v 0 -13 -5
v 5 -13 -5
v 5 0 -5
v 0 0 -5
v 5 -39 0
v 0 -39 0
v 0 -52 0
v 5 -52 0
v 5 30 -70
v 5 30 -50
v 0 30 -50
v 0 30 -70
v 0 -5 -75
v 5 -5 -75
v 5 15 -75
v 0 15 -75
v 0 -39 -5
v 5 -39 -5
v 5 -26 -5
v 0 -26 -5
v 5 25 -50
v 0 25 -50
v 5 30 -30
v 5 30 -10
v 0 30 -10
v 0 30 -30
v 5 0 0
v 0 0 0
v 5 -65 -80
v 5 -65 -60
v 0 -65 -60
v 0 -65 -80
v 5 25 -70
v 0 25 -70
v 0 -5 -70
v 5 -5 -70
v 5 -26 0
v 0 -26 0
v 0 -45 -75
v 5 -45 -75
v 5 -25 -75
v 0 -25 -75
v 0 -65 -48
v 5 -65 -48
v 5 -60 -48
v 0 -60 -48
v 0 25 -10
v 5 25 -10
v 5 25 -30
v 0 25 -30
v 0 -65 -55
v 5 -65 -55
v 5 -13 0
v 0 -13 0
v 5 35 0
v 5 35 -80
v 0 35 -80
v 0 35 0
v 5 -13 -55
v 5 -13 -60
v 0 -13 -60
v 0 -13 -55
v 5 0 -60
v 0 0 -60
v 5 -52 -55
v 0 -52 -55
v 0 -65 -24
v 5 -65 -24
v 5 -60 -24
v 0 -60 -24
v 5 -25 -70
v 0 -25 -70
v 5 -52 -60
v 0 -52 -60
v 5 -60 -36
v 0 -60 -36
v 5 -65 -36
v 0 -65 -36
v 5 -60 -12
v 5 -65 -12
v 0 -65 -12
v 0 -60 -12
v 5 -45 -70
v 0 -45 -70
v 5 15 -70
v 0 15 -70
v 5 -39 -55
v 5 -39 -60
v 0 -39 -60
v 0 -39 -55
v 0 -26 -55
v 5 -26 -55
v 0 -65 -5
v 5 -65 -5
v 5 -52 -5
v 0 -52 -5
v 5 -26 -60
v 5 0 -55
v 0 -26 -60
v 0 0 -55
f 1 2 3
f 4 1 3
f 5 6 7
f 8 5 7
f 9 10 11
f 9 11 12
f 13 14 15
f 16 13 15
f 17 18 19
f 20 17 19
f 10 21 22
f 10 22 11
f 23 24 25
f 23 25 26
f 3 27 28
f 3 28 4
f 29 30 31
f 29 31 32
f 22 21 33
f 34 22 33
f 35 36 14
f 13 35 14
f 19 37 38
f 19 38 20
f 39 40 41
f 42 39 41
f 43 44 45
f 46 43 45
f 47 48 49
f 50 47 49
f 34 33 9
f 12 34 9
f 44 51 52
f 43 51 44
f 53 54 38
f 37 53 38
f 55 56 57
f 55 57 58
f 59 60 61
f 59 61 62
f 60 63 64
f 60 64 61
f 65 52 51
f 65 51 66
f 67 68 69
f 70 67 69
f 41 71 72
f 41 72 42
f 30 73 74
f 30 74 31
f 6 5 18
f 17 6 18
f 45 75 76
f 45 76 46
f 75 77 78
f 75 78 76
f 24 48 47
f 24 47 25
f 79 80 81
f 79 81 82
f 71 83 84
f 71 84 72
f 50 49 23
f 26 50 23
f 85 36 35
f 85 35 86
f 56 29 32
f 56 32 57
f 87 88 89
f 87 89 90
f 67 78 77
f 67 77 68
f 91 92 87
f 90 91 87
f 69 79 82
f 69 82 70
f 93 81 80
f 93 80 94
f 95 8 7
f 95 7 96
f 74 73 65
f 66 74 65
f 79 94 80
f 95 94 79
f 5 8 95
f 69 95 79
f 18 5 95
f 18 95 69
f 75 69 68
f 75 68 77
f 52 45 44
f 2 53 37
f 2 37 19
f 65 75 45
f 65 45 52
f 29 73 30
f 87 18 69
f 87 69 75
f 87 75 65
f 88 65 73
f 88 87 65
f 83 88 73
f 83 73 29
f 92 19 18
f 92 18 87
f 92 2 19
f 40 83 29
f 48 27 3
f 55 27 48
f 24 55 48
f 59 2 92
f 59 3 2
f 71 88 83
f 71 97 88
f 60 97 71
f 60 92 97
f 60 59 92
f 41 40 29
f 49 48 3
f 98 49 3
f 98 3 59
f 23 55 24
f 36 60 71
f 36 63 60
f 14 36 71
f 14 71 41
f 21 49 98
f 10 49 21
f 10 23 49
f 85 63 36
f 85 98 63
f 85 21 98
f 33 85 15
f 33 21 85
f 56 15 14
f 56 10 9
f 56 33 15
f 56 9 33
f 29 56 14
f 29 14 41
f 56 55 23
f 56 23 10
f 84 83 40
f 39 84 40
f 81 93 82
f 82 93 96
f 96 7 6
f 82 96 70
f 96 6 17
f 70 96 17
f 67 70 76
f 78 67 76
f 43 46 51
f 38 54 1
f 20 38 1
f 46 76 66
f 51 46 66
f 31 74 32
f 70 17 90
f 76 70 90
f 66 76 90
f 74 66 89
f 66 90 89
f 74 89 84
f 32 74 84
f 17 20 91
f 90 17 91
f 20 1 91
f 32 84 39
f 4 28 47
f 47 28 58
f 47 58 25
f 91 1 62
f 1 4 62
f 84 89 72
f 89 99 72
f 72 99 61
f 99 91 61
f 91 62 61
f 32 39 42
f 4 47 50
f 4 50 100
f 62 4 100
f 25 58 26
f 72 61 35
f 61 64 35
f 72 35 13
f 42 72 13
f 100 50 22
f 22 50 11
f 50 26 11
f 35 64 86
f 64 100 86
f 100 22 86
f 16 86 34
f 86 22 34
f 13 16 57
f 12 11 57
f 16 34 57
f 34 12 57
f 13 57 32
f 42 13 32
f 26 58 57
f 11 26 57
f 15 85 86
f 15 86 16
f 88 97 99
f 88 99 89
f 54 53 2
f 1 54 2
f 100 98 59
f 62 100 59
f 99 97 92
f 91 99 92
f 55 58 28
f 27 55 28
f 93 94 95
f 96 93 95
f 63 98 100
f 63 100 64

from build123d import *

# Parameters (mm, degrees)
BOSS_EXTRU_1_DEPTH         = 5
ESQUISSE2_W                = 12
ESQUISSE2_H                = 5
ENL_V_MAT_EXTRU_1_DEPTH    = 5
R_P_TITION_LIN_AIRE1_COUNT = 2
R_P_TITION_LIN_AIRE1_PITCH = 24
ESQUISSE4_W                = 5
ESQUISSE4_H                = 13
ENL_V_MAT_EXTRU_2_DEPTH    = 5
R_P_TITION_LIN_AIRE2_COUNT = 3
R_P_TITION_LIN_AIRE2_PITCH = 26
SYM_TRIE1_COPY_1_SKETCH_W  = 5
SYM_TRIE1_COPY_1_SKETCH_H  = 13
SYM_TRIE1_COPY_1_DEPTH     = 5
SYM_TRIE1_COPY_2_SKETCH_W  = 5
SYM_TRIE1_COPY_2_SKETCH_H  = 13
SYM_TRIE1_COPY_2_DEPTH     = 5
BOSS_EXTRU_3_DEPTH         = 5
ESQUISSE7_W                = 20
ESQUISSE7_H                = 5
ENL_V_MAT_EXTRU_3_DEPTH    = 5
ESQUISSE8_W                = 5
ESQUISSE8_H                = 20
ENL_V_MAT_EXTRU_4_DEPTH    = 5


with BuildPart() as part:
    # Esquisse1 → Boss.-Extru.1 (new body)
    with BuildSketch(Plane(origin=(0, 0, 0), x_dir=(0, 0, -1), z_dir=(1, 0, 0))):
        Polygon((0, 0), (0, 35), (45, 35), (45, 0), (60, 0), (60, -65), (0, -65), align=None)
    extrude(amount=BOSS_EXTRU_1_DEPTH)

    # Esquisse2 → Enlèv. mat.-Extru.1 (cut)
    with BuildSketch(Plane(origin=(5, 0, 0), x_dir=(0, 0, -1), z_dir=(1, 0, 0))):
        with Locations((18, -62.5)):
            Rectangle(ESQUISSE2_W, ESQUISSE2_H)
    enl_v_mat_extru_1 = extrude(amount=-ENL_V_MAT_EXTRU_1_DEPTH, mode=Mode.SUBTRACT)

    # Répétition linéaire1: Enlèv. mat.-Extru.1 ×2
    with Locations(*[(0, 0, -i * R_P_TITION_LIN_AIRE1_PITCH) for i in range(1, R_P_TITION_LIN_AIRE1_COUNT)]):
        add(enl_v_mat_extru_1, mode=Mode.SUBTRACT)

    # Esquisse4 → Enlèv. mat.-Extru.2 (cut)
    with BuildSketch(Plane(origin=(5, 0, 0), x_dir=(0, 0, -1), z_dir=(1, 0, 0))):
        with Locations((2.5, -58.5)):
            Rectangle(ESQUISSE4_W, ESQUISSE4_H)
    enl_v_mat_extru_2 = extrude(amount=-ENL_V_MAT_EXTRU_2_DEPTH, mode=Mode.SUBTRACT)

    # Répétition linéaire2: Enlèv. mat.-Extru.2 ×3
    with Locations(*[(0, i * R_P_TITION_LIN_AIRE2_PITCH, 0) for i in range(1, R_P_TITION_LIN_AIRE2_COUNT)]):
        add(enl_v_mat_extru_2, mode=Mode.SUBTRACT)

    # Symétrie1: Enlèv. mat.-Extru.2 across plane
    add(enl_v_mat_extru_2.mirror(Plane.XY.offset(-30)), mode=Mode.SUBTRACT)

    # Symétrie1 copy 1 sketch → Symétrie1 copy 1 (cut)
    with BuildSketch(Plane(origin=(5, 26, -60), x_dir=(0, 0, 1), z_dir=(1, 0, 0))):
        with Locations((2.5, 58.5)):
            Rectangle(SYM_TRIE1_COPY_1_SKETCH_W, SYM_TRIE1_COPY_1_SKETCH_H)
    extrude(amount=-SYM_TRIE1_COPY_1_DEPTH, mode=Mode.SUBTRACT)

    # Symétrie1 copy 2 sketch → Symétrie1 copy 2 (cut)
    with BuildSketch(Plane(origin=(5, 52, -60), x_dir=(0, 0, 1), z_dir=(1, 0, 0))):
        with Locations((2.5, 58.5)):
            Rectangle(SYM_TRIE1_COPY_2_SKETCH_W, SYM_TRIE1_COPY_2_SKETCH_H)
    extrude(amount=-SYM_TRIE1_COPY_2_DEPTH, mode=Mode.SUBTRACT)

    # Esquisse5 → Boss.-Extru.3 (add)
    with BuildSketch(Plane(origin=(5, 0, 0), x_dir=(0, 0, -1), z_dir=(1, 0, 0))):
        Polygon((45, 0), (60, 0), (60, -65), (80, -65), (80, 35), (45, 35), align=None)
    extrude(amount=-BOSS_EXTRU_3_DEPTH)

    # Esquisse7 → Enlèv. mat.-Extru.3 (cut)
    with BuildSketch(Plane(origin=(5, 0, 0), x_dir=(0, 0, -1), z_dir=(1, 0, 0))):
        with Locations((20, 27.5)):
            Rectangle(ESQUISSE7_W, ESQUISSE7_H)
        with Locations((60, 27.5)):
            Rectangle(ESQUISSE7_W, ESQUISSE7_H)
    extrude(amount=-ENL_V_MAT_EXTRU_3_DEPTH, mode=Mode.SUBTRACT)

    # Esquisse8 → Enlèv. mat.-Extru.4 (cut)
    with BuildSketch(Plane(origin=(5, 0, 0), x_dir=(0, 0, -1), z_dir=(1, 0, 0))):
        with Locations((72.5, 5)):
            Rectangle(ESQUISSE8_W, ESQUISSE8_H)
        with Locations((72.5, -35)):
            Rectangle(ESQUISSE8_W, ESQUISSE8_H)
    extrude(amount=-ENL_V_MAT_EXTRU_4_DEPTH, mode=Mode.SUBTRACT)


solid = part.part
